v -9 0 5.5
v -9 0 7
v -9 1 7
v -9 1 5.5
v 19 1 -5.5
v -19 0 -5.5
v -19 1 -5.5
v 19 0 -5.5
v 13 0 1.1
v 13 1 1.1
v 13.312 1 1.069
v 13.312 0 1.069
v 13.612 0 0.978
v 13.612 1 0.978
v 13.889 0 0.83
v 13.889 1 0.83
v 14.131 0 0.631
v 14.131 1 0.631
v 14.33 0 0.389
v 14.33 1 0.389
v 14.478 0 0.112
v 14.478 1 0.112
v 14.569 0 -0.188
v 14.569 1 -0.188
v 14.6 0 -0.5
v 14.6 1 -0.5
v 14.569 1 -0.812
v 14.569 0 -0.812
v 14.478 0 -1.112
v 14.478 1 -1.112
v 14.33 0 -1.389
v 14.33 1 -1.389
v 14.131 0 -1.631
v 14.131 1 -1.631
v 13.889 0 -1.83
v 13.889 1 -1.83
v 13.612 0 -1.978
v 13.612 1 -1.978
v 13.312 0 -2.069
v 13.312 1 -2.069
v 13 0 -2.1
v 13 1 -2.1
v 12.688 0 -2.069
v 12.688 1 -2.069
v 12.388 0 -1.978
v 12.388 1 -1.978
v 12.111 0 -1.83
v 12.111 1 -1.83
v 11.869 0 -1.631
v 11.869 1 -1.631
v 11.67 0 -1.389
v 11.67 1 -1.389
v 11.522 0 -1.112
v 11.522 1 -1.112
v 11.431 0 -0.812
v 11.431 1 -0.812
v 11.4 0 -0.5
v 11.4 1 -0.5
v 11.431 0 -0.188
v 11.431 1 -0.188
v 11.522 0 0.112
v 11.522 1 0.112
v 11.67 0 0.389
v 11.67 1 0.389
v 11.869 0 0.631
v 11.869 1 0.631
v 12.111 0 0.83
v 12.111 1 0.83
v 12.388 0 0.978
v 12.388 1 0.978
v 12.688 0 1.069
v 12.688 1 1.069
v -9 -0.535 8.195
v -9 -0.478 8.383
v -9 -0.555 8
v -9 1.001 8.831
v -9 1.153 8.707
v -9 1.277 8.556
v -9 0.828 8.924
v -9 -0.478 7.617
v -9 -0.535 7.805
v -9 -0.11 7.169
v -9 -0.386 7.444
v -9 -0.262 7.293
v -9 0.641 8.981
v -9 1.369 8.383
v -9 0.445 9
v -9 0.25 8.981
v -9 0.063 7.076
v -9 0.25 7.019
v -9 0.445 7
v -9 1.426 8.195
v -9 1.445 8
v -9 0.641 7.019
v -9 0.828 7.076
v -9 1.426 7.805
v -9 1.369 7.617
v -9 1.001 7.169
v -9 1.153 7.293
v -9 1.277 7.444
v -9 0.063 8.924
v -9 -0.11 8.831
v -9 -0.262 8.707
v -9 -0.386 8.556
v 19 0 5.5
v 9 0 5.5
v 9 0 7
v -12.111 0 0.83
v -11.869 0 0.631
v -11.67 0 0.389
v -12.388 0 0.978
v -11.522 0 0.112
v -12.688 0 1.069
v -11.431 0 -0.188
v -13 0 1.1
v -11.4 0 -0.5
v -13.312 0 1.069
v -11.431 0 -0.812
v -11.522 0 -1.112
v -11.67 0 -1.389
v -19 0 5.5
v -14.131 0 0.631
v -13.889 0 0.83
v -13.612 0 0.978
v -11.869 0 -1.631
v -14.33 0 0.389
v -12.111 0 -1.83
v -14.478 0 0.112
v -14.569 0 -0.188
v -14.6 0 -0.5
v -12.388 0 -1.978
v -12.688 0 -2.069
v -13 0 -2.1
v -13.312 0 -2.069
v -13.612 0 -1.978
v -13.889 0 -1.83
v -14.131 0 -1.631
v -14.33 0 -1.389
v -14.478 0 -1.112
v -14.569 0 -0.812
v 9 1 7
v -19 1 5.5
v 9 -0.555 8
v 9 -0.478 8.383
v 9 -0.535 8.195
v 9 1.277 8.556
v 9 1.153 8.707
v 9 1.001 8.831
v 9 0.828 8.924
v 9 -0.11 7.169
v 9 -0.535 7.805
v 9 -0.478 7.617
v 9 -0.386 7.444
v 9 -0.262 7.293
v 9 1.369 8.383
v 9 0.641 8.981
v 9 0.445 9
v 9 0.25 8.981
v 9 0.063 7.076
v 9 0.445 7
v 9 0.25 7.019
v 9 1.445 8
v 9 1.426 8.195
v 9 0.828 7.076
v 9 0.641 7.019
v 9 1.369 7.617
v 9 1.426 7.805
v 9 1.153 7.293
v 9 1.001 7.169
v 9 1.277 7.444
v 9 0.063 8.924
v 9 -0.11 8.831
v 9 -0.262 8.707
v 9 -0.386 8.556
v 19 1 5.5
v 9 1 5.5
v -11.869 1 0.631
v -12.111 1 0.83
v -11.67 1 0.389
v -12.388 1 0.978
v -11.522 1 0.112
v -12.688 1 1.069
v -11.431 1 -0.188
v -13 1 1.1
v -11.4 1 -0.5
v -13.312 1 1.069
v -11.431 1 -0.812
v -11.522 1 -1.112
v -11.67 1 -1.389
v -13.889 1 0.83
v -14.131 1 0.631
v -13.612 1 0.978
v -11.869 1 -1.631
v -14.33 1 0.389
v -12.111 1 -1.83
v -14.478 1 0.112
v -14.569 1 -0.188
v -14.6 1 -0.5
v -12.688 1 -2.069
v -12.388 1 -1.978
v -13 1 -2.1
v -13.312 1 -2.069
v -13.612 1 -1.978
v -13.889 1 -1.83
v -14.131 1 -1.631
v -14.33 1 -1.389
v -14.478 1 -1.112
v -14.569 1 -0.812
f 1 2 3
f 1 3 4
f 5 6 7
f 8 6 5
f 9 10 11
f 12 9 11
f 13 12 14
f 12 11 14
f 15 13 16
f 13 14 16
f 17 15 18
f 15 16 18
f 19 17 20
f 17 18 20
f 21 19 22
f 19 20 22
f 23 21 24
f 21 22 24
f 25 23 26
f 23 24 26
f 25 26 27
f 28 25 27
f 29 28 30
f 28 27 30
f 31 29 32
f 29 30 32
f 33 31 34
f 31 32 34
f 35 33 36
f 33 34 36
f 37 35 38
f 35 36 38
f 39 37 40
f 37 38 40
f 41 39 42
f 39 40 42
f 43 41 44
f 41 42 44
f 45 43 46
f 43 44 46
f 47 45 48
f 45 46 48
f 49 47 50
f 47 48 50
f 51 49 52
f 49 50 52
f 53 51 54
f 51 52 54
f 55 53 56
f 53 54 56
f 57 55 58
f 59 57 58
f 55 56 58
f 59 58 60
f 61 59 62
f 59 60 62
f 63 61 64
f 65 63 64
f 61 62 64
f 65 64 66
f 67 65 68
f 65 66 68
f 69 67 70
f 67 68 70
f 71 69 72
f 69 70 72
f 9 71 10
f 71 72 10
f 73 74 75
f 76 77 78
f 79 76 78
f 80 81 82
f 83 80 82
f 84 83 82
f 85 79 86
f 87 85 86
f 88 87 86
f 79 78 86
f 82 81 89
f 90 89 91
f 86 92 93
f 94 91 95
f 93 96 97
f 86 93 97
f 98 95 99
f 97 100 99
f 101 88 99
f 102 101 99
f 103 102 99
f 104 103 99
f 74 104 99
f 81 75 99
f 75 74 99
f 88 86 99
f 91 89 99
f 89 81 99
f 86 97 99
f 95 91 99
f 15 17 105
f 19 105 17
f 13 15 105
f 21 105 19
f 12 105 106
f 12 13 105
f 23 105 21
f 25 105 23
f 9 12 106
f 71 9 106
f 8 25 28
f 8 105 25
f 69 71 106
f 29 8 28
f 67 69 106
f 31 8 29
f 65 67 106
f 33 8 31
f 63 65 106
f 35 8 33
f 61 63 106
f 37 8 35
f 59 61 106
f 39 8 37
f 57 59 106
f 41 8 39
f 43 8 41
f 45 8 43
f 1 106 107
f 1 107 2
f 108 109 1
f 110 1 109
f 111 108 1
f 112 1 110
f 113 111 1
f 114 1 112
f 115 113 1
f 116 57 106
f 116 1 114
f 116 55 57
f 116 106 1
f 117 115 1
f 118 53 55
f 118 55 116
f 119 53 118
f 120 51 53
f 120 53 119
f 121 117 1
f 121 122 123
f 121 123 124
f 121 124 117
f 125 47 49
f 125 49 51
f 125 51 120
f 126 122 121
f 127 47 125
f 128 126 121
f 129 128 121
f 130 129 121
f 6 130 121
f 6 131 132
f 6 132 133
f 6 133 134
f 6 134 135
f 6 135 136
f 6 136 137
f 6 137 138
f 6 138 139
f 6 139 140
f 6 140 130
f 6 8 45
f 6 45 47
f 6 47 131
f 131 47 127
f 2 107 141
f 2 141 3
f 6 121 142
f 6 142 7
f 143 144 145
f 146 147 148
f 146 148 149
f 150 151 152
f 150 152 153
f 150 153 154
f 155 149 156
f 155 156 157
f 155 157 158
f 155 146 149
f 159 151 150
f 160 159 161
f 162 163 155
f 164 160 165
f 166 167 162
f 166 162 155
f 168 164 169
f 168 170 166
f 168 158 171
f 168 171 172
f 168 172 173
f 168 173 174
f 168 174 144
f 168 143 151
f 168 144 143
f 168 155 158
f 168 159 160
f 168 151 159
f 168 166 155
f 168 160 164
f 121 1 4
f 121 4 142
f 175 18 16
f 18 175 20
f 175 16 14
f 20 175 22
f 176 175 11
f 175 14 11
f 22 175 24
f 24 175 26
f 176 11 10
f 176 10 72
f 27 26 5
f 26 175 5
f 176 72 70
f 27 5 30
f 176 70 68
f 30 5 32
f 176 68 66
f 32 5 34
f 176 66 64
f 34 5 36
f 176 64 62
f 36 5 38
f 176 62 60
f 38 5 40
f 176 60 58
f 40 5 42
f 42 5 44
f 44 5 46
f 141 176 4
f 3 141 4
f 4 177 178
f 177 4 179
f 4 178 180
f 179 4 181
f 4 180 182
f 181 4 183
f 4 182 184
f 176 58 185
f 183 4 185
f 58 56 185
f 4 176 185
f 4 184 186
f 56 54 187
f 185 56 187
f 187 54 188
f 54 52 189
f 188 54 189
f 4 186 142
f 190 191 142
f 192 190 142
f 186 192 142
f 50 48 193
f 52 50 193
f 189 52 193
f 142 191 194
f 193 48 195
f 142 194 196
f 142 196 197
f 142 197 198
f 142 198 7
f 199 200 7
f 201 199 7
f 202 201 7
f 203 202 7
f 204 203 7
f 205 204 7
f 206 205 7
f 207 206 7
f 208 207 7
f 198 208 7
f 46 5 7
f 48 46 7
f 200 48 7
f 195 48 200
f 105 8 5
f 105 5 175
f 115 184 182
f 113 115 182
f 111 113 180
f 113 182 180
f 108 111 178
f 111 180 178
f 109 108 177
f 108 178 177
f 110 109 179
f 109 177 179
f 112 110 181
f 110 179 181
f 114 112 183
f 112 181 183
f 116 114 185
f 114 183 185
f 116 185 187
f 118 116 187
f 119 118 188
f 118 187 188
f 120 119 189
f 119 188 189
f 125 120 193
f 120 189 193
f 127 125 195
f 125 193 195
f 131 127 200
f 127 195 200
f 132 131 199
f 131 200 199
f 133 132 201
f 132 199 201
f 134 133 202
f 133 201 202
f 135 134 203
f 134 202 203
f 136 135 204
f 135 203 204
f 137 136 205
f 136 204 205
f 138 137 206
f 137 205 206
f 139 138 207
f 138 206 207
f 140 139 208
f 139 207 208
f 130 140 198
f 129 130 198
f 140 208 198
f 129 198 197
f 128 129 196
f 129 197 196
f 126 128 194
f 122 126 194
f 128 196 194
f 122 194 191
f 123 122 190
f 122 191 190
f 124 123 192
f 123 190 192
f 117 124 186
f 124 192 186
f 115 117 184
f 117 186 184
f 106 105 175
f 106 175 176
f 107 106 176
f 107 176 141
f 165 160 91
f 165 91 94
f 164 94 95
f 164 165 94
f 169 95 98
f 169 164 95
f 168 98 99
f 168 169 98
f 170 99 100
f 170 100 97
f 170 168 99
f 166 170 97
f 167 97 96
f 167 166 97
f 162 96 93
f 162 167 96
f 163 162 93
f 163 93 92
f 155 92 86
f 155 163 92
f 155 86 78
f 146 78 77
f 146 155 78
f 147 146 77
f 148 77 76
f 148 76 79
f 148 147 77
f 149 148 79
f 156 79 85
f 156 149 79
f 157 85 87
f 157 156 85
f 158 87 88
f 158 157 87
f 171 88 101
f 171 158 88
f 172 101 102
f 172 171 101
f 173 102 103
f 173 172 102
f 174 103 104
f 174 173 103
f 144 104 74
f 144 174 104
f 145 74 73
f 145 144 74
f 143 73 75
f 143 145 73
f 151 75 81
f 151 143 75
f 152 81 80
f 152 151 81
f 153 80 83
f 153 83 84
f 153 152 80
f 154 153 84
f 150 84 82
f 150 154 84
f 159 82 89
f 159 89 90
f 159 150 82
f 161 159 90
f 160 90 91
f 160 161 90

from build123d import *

# Parameters (mm, degrees)
EXTRUDE_1_DEPTH     = 1
SKETCH_2_R          = 1
EXTRUDE_2_DEPTH     = 18
SKETCH_3_R          = 1.6
CUT_EXTRUDE_1_DEPTH = 1


with BuildPart() as part:
    # 草图1 → 凸台-拉伸1 (new body)
    with BuildSketch(Plane(origin=(0, 0, 0), x_dir=(1, 0, 0), z_dir=(0, 1, 0))):
        Polygon((-19, 5.5), (19, 5.5), (19, -5.5), (9, -5.5), (9, -7), (-9, -7), (-9, -5.5), (-19, -5.5), align=None)
    extrude(amount=EXTRUDE_1_DEPTH)

    # 草图3 → 切除-拉伸1 (cut)
    with BuildSketch(Plane(origin=(0, 1, 0), x_dir=(1, 0, 0), z_dir=(0, 1, 0))):
        with Locations(Location((-13, 0.5, 0), (0, 0, 270))):
            Circle(SKETCH_3_R)
        with Locations(Location((13, 0.5, 0), (0, 0, 270))):
            Circle(SKETCH_3_R)
    extrude(amount=-CUT_EXTRUDE_1_DEPTH, mode=Mode.SUBTRACT)


with BuildPart() as body_2:
    # 草图2 → 凸台-拉伸2 (new body)
    with BuildSketch(Plane(origin=(9, 0, 0), x_dir=(0, 0, -1), z_dir=(1, 0, 0))):
        with Locations((-8, 0.445452926)):
            Circle(SKETCH_2_R)
    extrude(amount=-EXTRUDE_2_DEPTH)


solid = Compound([part.part, body_2.part])
